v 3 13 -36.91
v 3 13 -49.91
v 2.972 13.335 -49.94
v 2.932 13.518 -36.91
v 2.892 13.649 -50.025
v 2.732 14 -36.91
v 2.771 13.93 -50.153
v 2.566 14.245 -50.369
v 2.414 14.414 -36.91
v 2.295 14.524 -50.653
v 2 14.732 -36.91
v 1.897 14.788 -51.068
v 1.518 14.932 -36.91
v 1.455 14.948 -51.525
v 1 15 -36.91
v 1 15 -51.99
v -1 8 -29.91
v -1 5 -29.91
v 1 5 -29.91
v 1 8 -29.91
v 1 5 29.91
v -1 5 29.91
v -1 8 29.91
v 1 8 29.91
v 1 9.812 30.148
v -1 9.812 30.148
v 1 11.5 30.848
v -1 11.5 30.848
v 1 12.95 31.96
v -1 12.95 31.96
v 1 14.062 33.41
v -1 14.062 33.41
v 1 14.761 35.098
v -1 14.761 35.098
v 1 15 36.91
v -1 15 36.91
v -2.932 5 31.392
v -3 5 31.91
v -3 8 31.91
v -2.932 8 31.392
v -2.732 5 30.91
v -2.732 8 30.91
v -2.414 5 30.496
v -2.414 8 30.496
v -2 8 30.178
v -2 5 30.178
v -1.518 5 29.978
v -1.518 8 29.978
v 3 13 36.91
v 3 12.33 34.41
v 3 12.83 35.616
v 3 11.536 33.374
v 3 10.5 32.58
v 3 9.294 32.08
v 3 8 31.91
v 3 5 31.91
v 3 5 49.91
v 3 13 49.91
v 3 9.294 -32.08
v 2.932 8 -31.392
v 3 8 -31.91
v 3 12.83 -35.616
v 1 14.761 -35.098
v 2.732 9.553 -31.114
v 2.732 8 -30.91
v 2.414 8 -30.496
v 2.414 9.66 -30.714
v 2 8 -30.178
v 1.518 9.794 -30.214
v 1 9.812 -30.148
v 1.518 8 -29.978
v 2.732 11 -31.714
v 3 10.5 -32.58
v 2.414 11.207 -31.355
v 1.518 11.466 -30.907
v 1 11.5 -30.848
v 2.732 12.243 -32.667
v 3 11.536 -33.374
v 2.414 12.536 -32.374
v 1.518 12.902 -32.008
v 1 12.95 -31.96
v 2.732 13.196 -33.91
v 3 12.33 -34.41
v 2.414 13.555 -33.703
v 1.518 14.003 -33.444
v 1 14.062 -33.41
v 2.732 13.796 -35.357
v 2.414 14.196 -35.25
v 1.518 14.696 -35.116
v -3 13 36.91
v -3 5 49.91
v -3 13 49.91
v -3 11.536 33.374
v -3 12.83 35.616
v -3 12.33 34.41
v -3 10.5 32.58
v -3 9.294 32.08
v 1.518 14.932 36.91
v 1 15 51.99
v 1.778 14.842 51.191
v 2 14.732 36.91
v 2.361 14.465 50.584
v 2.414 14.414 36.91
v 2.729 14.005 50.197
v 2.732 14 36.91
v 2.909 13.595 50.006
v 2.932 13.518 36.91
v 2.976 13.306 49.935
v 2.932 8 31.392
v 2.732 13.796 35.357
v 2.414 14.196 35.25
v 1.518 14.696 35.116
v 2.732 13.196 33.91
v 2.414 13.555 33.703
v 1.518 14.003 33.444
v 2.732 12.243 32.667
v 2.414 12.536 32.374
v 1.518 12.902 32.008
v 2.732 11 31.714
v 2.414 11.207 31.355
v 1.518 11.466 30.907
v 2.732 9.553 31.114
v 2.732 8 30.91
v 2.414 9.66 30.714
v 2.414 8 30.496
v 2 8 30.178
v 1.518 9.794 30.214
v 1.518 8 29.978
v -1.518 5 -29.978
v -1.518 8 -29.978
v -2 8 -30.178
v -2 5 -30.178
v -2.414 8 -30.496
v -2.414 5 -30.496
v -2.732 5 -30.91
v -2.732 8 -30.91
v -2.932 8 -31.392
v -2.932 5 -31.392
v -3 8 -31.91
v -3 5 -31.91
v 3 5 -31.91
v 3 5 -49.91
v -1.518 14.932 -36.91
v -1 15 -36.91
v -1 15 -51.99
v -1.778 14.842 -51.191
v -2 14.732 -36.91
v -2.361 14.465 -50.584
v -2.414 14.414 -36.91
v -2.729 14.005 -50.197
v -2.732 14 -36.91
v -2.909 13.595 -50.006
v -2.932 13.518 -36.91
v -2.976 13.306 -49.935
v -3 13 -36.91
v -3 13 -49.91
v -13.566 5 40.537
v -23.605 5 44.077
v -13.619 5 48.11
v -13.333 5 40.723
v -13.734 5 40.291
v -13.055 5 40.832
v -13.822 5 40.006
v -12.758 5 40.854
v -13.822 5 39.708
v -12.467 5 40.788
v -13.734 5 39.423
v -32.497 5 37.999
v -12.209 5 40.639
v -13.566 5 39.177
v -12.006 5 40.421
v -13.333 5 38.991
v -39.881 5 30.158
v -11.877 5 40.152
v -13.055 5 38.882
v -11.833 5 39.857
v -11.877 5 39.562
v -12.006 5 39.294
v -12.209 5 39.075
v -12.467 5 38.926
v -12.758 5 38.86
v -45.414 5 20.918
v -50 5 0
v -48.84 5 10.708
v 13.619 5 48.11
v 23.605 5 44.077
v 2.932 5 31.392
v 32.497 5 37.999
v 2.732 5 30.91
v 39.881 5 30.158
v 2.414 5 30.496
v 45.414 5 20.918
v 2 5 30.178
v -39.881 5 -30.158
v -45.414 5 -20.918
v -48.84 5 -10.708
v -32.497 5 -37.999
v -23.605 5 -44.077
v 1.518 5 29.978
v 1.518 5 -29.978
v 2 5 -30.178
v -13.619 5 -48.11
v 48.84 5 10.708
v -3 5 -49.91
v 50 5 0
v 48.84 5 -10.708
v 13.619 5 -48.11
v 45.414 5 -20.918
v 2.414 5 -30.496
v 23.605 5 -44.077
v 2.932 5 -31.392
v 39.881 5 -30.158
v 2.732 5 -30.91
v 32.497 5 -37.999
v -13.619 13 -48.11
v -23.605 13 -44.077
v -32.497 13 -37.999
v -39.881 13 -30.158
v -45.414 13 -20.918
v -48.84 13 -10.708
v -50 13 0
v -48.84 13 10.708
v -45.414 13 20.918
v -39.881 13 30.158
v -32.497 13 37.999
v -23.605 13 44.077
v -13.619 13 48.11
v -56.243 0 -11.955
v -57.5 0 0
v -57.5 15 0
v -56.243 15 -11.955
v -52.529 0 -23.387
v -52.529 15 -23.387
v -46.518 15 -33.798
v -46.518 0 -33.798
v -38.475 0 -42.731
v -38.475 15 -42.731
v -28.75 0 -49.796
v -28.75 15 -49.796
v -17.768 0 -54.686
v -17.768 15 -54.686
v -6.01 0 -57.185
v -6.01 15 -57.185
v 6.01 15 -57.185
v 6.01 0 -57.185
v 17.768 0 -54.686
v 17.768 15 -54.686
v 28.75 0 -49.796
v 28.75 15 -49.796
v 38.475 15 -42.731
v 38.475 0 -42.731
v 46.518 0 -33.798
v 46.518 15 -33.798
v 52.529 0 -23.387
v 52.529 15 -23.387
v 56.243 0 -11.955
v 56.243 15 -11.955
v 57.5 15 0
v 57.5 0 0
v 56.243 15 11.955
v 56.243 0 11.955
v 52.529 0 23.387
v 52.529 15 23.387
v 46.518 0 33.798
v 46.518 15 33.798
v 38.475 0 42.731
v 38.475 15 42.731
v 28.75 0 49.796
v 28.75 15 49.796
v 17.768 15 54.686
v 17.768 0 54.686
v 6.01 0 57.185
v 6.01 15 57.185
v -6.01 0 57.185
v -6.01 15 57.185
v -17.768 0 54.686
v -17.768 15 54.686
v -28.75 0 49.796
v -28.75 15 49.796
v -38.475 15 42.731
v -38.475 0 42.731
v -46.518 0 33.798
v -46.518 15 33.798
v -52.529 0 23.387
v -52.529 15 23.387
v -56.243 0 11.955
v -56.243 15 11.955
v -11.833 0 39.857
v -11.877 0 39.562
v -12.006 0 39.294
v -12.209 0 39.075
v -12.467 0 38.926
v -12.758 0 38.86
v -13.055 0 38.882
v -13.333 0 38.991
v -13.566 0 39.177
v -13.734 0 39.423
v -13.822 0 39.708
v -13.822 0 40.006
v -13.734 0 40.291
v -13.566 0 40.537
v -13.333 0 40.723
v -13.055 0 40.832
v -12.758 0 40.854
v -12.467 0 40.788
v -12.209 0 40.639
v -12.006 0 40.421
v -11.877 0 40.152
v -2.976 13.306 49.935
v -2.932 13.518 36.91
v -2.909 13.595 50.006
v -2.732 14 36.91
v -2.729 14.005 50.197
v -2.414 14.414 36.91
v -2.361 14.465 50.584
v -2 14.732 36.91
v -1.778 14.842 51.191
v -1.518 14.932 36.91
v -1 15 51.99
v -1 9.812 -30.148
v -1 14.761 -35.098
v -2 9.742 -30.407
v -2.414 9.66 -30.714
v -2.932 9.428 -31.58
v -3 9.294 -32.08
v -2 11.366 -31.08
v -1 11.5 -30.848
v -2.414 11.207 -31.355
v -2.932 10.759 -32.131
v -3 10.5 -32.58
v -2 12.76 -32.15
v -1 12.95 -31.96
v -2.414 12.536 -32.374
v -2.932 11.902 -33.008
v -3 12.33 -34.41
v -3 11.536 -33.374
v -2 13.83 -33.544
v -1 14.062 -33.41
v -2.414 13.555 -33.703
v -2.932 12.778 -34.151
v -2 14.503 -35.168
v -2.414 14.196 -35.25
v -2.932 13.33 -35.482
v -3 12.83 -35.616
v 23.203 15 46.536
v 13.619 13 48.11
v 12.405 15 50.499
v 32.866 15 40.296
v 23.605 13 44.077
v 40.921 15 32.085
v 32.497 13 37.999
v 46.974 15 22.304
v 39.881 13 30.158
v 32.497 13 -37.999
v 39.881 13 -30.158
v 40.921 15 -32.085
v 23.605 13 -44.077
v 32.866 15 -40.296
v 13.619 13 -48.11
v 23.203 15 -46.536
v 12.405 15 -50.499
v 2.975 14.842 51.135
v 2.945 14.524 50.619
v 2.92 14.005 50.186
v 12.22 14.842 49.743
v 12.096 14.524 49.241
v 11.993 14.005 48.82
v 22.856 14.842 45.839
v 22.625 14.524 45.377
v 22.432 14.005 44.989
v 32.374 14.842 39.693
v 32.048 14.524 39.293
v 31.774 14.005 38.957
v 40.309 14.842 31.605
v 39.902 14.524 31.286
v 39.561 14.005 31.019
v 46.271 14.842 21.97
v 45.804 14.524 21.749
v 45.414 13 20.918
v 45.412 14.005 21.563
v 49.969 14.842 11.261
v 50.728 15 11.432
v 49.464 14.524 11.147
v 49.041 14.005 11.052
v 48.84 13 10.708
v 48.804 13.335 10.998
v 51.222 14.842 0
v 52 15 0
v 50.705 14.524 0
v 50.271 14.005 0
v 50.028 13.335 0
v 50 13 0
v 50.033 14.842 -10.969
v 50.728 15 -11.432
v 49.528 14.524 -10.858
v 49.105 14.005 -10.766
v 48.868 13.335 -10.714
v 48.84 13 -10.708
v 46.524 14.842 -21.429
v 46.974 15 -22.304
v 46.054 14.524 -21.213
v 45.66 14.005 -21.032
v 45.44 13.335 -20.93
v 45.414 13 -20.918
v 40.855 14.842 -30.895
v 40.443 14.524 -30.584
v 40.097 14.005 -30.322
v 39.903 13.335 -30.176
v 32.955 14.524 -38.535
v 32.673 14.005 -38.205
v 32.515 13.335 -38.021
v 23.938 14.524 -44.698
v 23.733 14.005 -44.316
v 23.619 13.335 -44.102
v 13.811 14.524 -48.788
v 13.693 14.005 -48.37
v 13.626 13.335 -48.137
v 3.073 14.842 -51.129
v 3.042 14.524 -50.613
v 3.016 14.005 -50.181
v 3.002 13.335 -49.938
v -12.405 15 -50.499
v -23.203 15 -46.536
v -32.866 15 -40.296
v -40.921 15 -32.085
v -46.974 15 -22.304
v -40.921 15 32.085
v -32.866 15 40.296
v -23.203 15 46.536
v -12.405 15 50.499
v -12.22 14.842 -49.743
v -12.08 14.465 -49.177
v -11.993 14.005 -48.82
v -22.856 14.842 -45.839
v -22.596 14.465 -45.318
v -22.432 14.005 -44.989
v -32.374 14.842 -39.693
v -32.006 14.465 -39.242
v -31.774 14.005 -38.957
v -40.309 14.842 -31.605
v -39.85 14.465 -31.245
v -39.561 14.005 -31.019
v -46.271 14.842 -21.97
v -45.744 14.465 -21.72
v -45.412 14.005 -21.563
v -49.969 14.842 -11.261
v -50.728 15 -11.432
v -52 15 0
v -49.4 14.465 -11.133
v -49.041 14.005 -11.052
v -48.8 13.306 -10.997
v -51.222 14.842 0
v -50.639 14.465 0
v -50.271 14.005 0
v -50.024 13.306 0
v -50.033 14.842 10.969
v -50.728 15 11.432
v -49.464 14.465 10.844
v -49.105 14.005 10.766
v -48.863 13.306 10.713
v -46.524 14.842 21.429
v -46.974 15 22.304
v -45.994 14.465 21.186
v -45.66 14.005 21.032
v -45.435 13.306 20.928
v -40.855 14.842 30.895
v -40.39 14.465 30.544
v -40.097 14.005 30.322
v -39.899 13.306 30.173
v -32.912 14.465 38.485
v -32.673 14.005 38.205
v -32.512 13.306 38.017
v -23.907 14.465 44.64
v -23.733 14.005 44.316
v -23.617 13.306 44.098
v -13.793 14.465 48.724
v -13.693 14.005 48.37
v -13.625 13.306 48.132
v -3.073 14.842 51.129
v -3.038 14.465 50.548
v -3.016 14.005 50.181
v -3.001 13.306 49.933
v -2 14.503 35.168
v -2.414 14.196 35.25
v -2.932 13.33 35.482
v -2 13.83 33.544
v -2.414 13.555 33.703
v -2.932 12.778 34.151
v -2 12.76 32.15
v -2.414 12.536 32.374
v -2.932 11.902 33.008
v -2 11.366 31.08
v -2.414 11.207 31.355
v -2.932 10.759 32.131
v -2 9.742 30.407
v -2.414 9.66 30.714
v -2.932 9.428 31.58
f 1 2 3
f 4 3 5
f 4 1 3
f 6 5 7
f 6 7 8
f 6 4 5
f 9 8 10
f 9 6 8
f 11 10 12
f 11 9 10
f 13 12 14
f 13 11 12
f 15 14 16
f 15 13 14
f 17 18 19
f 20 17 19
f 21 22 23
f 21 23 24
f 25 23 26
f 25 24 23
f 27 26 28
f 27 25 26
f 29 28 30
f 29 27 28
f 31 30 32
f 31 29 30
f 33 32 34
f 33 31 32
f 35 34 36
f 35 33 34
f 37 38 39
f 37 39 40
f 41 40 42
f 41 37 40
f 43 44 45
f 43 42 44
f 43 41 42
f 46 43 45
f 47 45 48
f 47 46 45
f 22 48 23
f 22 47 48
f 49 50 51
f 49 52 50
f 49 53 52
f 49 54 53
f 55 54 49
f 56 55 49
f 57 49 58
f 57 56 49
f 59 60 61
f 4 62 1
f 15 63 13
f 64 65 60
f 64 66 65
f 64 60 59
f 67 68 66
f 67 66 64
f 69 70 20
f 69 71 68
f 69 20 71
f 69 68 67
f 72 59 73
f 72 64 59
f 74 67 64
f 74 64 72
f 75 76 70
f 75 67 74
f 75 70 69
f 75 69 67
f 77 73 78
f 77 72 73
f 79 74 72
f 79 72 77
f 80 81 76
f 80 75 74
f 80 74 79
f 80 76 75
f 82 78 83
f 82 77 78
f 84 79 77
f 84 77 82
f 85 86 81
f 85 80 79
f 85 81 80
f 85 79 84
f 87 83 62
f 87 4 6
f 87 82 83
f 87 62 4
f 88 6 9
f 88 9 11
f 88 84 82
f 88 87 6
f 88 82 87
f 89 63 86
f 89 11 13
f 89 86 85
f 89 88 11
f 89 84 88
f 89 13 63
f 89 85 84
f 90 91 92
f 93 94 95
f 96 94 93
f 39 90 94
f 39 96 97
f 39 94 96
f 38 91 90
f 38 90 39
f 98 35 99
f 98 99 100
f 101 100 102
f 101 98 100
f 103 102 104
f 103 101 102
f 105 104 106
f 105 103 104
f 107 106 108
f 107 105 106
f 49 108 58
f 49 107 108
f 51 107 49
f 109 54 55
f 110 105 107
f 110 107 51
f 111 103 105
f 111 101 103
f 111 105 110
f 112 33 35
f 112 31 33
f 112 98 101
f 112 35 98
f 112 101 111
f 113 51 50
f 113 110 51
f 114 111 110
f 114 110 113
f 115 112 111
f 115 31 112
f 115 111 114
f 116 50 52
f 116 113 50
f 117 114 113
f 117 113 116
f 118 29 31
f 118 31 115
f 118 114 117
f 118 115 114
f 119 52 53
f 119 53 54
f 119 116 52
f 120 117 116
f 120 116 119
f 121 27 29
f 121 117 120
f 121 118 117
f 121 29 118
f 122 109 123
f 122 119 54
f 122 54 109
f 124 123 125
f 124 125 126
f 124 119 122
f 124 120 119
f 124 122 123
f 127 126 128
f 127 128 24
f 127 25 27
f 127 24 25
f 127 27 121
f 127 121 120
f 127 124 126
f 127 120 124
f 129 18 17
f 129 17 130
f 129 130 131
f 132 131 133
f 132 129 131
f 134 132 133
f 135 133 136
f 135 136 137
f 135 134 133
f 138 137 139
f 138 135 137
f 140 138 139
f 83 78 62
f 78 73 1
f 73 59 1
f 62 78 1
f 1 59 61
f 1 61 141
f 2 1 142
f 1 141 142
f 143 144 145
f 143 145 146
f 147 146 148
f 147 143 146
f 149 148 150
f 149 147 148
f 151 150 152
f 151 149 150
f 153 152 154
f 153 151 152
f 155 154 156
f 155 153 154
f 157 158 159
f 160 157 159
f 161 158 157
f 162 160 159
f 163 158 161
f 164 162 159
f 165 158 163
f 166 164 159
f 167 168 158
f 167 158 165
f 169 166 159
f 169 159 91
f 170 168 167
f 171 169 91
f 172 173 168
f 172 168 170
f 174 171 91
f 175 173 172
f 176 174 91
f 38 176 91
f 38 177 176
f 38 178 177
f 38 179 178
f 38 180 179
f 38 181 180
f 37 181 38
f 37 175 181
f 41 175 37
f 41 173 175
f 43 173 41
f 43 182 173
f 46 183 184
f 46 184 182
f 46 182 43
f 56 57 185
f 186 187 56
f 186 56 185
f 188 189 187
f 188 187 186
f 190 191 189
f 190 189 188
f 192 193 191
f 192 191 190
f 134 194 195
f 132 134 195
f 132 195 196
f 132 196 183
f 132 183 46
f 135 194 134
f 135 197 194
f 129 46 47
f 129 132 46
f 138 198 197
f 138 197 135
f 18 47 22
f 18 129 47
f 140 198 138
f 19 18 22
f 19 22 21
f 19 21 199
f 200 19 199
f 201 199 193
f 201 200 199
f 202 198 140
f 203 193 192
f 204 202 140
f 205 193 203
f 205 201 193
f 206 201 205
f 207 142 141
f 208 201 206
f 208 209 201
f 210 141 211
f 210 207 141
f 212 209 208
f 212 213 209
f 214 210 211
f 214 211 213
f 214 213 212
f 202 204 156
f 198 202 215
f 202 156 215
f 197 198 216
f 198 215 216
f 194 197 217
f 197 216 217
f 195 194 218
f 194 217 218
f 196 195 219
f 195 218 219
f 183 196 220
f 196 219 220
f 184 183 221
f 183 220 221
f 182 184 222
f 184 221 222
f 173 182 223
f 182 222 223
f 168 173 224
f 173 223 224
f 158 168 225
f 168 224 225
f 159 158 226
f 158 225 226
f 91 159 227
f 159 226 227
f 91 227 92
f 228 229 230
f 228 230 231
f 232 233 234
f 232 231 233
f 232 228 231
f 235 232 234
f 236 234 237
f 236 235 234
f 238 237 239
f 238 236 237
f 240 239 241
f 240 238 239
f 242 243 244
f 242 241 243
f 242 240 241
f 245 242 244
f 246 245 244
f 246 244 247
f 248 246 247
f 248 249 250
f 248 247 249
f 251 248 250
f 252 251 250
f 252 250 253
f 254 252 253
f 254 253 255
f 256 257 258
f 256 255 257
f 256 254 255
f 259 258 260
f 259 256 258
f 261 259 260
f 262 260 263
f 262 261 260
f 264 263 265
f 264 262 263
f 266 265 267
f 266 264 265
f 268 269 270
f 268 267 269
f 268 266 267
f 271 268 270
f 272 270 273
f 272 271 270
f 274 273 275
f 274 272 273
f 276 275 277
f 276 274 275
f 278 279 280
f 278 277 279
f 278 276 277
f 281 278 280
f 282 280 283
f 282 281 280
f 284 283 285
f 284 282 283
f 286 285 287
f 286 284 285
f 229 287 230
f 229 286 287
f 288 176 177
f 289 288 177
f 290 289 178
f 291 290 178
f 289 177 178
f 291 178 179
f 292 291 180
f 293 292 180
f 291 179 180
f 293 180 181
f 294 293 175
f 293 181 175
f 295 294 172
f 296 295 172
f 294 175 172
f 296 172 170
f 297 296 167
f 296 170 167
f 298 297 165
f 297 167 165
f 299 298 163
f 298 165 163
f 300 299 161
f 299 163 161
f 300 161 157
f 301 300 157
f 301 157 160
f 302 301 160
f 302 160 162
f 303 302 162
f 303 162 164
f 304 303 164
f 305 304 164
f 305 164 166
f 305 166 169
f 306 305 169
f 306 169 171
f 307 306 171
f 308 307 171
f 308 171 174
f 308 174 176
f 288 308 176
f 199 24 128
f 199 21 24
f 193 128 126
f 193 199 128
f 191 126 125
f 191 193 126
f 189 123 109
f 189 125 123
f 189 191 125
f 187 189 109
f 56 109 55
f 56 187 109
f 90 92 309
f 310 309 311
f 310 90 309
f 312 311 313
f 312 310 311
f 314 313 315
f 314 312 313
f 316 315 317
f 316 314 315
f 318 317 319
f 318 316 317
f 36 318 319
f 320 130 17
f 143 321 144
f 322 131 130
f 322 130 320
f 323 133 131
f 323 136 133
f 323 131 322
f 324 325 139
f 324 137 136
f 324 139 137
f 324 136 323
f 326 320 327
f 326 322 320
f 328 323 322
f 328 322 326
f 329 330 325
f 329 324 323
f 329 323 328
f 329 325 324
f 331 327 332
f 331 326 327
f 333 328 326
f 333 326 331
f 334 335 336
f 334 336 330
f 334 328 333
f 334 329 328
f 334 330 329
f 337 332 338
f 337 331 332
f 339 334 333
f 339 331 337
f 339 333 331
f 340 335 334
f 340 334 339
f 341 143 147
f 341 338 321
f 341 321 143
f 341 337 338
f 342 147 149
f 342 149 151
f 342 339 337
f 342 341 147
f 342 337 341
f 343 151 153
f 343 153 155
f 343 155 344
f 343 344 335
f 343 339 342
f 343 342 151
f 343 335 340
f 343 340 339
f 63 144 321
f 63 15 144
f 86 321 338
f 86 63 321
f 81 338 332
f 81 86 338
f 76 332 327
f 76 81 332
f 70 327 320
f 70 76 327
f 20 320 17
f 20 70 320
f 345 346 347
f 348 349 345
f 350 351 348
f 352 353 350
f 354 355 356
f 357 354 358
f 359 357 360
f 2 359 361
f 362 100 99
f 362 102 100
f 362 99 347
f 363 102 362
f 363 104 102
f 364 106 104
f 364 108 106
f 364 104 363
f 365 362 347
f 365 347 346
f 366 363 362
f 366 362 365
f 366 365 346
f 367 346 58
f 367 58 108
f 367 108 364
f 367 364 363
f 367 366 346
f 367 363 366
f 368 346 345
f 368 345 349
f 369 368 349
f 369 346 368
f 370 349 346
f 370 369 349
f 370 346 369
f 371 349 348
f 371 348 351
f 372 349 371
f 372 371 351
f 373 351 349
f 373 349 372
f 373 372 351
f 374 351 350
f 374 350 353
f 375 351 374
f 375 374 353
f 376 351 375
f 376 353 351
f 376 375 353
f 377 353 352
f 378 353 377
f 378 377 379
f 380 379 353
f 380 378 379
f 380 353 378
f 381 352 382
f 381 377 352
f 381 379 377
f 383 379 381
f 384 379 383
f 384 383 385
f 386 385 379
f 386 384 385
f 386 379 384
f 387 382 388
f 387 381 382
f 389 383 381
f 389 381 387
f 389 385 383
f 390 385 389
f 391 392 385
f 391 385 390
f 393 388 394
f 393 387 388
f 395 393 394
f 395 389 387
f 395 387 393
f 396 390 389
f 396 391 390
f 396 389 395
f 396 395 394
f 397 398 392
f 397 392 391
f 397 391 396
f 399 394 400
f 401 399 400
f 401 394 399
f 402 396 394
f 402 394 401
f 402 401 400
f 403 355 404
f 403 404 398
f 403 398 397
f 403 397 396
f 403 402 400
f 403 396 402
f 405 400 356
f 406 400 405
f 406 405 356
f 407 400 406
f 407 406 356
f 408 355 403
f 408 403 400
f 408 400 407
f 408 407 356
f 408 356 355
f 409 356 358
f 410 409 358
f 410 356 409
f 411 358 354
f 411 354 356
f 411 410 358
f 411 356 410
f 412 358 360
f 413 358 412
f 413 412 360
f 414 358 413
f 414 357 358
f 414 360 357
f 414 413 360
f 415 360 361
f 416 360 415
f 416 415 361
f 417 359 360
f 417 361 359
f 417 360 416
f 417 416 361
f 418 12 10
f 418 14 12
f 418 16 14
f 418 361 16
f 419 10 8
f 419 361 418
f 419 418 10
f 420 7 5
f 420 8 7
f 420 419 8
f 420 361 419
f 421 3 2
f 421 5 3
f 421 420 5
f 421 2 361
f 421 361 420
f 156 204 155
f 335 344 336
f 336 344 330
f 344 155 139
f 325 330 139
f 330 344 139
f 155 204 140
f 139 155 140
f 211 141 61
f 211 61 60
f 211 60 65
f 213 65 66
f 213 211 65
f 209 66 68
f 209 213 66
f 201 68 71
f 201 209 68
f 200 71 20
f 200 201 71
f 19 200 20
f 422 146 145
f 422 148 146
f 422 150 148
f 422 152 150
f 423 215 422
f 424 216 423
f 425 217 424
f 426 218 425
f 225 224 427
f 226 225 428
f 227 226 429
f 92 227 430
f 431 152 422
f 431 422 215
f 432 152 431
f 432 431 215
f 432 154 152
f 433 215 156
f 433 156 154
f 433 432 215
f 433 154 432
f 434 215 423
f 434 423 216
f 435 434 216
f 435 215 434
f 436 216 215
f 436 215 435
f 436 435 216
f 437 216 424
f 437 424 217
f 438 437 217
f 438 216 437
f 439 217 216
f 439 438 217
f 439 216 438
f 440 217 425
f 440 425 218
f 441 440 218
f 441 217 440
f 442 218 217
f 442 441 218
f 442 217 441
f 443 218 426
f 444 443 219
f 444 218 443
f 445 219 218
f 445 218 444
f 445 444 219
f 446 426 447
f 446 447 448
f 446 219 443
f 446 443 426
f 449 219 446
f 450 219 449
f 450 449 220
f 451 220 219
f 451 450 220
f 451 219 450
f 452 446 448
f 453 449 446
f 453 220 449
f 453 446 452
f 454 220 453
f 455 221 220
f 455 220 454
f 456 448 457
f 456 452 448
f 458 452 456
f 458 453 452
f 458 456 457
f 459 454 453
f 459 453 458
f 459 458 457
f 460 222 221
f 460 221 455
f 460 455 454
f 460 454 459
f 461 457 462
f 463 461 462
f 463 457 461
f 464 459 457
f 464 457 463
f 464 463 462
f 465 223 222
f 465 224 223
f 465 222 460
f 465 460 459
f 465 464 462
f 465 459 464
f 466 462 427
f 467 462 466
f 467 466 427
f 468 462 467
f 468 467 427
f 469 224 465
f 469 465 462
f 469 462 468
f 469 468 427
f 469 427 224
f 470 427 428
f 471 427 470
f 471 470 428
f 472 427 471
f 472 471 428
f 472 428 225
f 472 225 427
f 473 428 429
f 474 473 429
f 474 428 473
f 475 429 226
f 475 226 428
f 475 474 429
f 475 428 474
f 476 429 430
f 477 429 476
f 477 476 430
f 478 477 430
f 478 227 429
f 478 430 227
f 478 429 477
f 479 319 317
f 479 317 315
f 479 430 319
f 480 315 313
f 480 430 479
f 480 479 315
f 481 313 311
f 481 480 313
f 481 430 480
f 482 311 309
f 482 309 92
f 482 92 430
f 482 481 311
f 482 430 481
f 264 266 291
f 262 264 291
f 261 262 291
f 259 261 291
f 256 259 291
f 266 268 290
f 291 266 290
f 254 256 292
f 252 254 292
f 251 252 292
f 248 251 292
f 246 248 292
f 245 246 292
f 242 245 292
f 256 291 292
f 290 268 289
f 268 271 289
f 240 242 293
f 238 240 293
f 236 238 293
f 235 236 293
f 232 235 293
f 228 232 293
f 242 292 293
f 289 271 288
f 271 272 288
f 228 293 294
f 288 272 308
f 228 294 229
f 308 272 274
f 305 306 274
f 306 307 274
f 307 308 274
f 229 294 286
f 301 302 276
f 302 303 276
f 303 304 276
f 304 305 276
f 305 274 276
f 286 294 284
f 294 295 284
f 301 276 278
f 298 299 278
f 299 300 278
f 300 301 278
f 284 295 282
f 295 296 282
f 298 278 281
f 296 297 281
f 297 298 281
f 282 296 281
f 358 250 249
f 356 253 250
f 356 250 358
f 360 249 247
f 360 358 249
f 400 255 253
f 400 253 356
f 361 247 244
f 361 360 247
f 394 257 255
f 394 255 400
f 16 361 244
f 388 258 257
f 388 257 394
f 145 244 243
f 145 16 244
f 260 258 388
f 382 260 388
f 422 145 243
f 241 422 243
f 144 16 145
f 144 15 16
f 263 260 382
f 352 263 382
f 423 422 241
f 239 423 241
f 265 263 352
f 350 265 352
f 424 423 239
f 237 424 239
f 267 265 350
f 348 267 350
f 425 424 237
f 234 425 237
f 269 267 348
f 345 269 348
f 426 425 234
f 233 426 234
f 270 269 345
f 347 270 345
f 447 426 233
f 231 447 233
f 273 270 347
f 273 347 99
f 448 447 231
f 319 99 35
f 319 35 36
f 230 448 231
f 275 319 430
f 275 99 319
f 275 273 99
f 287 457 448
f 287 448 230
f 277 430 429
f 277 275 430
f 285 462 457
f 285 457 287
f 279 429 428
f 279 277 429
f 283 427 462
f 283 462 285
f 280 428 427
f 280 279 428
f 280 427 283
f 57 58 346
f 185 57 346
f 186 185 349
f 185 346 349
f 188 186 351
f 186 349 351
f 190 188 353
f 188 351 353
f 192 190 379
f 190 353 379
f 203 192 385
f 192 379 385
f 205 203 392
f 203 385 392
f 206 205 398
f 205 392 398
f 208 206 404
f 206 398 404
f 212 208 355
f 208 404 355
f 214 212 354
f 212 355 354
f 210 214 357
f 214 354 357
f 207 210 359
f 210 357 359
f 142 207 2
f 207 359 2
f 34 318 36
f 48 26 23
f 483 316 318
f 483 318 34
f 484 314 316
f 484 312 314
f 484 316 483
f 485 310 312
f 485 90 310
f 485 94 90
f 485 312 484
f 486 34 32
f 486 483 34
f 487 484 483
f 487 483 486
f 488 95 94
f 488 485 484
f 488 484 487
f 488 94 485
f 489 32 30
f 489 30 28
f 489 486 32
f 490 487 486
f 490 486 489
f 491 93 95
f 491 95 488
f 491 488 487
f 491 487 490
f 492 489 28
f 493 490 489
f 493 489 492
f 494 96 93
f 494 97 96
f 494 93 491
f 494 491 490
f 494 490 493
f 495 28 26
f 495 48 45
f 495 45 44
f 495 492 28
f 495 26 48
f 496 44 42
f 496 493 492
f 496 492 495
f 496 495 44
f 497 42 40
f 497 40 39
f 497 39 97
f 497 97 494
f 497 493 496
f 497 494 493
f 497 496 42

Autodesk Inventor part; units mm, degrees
ref_plane "YZ Plane" through (0, 0, 0) normal (1, 0, 0) x (0, 1, 0)
ref_plane "XZ Plane" through (0, 0, 0) normal (0, 1, 0) x (-1, 0, 0)
ref_plane "XY Plane" through (0, 0, 0) normal (0, 0, 1) x (1, 0, 0)
sketch "Sketch1" plane through (0, 0, 0) normal (0, 1, 0) x (-1, 0, 0)
  circle A0 centre (0, 0) radius 57.5
  dimension "d0" = 115
extrude "Extrusion1" add sketch "Sketch1" along normal blind 15
sketch "Sketch2" plane through (0, 15, 0) normal (0, 1, 0) x (1, 0, 0)
  circle A0 centre (0, 0) radius 57.5 construction
  circle A1 centre (0, 0) radius 50
  dimension "d3" = 100
extrude "Extrusion2" cut sketch "Sketch2" against normal blind 10
sketch "Sketch3" plane through (0, 5, 0) normal (0, 1, 0) x (1, 0, 0)
  circle A0 centre (0, 0) radius 50 construction
  line L0 (-3, -49.9099) -> (-3, -29.9099)
  line L1 (-3, -29.9099) -> (3, -29.9099)
  line L2 (3, -29.9099) -> (3, -49.9099)
  circle A1 centre (0, 0) radius 50
  line L3 (0, 0) -> (-15.0126, 0) construction
  circle A2 centre (0, 0) radius 50 construction
  line L4 (-3, 49.9099) -> (-3, 29.9099)
  line L5 (-3, 29.9099) -> (3, 29.9099)
  line L6 (3, 29.9099) -> (3, 49.9099)
  circle A3 centre (0, 0) radius 50
  dimension "d6" = 20
  dimension "d7" = 3
  dimension "d8" = 6
extrude "Extrusion3" add sketch "Sketch3" along normal blind 10 contours L0 L1 L2 A1 | A1 L6 L5 L4
fillet "Fillet2" radius 7 2 edges at (0, 15, 29.9099) (0, 15, -29.9099)
fillet "Fillet3" radius 2 14 edges at (3, 12.9497, -31.9602) (3, 6.5, -29.9099) (3, 15, -43.4099) (-3, 12.9497, -31.9602) (-3, 6.5, -29.9099) (-3, 15, -43.4099) (-50, 15, 0) (50, 15, 0) (3, 12.9497, 31.9602) (3, 6.5, 29.9099) (3, 15, 43.4099) (-3, 12.9497, 31.9602) (-3, 6.5, 29.9099) (-3, 15, 43.4099)
thread "Thread1" size "M115x4" class "6g" standard "ANSI Metric M Profile" length 15
sketch "Sketch4" plane through (0, 5, 0) normal (0, 1, 0) x (1, 0, 0)
  circle A0 centre (-12.8327, -39.8572) radius 1
  dimension "d16" = 2
extrude "Extrusion4" cut sketch "Sketch4" against normal blind 10
properties part number "Capac" material "Glass"
